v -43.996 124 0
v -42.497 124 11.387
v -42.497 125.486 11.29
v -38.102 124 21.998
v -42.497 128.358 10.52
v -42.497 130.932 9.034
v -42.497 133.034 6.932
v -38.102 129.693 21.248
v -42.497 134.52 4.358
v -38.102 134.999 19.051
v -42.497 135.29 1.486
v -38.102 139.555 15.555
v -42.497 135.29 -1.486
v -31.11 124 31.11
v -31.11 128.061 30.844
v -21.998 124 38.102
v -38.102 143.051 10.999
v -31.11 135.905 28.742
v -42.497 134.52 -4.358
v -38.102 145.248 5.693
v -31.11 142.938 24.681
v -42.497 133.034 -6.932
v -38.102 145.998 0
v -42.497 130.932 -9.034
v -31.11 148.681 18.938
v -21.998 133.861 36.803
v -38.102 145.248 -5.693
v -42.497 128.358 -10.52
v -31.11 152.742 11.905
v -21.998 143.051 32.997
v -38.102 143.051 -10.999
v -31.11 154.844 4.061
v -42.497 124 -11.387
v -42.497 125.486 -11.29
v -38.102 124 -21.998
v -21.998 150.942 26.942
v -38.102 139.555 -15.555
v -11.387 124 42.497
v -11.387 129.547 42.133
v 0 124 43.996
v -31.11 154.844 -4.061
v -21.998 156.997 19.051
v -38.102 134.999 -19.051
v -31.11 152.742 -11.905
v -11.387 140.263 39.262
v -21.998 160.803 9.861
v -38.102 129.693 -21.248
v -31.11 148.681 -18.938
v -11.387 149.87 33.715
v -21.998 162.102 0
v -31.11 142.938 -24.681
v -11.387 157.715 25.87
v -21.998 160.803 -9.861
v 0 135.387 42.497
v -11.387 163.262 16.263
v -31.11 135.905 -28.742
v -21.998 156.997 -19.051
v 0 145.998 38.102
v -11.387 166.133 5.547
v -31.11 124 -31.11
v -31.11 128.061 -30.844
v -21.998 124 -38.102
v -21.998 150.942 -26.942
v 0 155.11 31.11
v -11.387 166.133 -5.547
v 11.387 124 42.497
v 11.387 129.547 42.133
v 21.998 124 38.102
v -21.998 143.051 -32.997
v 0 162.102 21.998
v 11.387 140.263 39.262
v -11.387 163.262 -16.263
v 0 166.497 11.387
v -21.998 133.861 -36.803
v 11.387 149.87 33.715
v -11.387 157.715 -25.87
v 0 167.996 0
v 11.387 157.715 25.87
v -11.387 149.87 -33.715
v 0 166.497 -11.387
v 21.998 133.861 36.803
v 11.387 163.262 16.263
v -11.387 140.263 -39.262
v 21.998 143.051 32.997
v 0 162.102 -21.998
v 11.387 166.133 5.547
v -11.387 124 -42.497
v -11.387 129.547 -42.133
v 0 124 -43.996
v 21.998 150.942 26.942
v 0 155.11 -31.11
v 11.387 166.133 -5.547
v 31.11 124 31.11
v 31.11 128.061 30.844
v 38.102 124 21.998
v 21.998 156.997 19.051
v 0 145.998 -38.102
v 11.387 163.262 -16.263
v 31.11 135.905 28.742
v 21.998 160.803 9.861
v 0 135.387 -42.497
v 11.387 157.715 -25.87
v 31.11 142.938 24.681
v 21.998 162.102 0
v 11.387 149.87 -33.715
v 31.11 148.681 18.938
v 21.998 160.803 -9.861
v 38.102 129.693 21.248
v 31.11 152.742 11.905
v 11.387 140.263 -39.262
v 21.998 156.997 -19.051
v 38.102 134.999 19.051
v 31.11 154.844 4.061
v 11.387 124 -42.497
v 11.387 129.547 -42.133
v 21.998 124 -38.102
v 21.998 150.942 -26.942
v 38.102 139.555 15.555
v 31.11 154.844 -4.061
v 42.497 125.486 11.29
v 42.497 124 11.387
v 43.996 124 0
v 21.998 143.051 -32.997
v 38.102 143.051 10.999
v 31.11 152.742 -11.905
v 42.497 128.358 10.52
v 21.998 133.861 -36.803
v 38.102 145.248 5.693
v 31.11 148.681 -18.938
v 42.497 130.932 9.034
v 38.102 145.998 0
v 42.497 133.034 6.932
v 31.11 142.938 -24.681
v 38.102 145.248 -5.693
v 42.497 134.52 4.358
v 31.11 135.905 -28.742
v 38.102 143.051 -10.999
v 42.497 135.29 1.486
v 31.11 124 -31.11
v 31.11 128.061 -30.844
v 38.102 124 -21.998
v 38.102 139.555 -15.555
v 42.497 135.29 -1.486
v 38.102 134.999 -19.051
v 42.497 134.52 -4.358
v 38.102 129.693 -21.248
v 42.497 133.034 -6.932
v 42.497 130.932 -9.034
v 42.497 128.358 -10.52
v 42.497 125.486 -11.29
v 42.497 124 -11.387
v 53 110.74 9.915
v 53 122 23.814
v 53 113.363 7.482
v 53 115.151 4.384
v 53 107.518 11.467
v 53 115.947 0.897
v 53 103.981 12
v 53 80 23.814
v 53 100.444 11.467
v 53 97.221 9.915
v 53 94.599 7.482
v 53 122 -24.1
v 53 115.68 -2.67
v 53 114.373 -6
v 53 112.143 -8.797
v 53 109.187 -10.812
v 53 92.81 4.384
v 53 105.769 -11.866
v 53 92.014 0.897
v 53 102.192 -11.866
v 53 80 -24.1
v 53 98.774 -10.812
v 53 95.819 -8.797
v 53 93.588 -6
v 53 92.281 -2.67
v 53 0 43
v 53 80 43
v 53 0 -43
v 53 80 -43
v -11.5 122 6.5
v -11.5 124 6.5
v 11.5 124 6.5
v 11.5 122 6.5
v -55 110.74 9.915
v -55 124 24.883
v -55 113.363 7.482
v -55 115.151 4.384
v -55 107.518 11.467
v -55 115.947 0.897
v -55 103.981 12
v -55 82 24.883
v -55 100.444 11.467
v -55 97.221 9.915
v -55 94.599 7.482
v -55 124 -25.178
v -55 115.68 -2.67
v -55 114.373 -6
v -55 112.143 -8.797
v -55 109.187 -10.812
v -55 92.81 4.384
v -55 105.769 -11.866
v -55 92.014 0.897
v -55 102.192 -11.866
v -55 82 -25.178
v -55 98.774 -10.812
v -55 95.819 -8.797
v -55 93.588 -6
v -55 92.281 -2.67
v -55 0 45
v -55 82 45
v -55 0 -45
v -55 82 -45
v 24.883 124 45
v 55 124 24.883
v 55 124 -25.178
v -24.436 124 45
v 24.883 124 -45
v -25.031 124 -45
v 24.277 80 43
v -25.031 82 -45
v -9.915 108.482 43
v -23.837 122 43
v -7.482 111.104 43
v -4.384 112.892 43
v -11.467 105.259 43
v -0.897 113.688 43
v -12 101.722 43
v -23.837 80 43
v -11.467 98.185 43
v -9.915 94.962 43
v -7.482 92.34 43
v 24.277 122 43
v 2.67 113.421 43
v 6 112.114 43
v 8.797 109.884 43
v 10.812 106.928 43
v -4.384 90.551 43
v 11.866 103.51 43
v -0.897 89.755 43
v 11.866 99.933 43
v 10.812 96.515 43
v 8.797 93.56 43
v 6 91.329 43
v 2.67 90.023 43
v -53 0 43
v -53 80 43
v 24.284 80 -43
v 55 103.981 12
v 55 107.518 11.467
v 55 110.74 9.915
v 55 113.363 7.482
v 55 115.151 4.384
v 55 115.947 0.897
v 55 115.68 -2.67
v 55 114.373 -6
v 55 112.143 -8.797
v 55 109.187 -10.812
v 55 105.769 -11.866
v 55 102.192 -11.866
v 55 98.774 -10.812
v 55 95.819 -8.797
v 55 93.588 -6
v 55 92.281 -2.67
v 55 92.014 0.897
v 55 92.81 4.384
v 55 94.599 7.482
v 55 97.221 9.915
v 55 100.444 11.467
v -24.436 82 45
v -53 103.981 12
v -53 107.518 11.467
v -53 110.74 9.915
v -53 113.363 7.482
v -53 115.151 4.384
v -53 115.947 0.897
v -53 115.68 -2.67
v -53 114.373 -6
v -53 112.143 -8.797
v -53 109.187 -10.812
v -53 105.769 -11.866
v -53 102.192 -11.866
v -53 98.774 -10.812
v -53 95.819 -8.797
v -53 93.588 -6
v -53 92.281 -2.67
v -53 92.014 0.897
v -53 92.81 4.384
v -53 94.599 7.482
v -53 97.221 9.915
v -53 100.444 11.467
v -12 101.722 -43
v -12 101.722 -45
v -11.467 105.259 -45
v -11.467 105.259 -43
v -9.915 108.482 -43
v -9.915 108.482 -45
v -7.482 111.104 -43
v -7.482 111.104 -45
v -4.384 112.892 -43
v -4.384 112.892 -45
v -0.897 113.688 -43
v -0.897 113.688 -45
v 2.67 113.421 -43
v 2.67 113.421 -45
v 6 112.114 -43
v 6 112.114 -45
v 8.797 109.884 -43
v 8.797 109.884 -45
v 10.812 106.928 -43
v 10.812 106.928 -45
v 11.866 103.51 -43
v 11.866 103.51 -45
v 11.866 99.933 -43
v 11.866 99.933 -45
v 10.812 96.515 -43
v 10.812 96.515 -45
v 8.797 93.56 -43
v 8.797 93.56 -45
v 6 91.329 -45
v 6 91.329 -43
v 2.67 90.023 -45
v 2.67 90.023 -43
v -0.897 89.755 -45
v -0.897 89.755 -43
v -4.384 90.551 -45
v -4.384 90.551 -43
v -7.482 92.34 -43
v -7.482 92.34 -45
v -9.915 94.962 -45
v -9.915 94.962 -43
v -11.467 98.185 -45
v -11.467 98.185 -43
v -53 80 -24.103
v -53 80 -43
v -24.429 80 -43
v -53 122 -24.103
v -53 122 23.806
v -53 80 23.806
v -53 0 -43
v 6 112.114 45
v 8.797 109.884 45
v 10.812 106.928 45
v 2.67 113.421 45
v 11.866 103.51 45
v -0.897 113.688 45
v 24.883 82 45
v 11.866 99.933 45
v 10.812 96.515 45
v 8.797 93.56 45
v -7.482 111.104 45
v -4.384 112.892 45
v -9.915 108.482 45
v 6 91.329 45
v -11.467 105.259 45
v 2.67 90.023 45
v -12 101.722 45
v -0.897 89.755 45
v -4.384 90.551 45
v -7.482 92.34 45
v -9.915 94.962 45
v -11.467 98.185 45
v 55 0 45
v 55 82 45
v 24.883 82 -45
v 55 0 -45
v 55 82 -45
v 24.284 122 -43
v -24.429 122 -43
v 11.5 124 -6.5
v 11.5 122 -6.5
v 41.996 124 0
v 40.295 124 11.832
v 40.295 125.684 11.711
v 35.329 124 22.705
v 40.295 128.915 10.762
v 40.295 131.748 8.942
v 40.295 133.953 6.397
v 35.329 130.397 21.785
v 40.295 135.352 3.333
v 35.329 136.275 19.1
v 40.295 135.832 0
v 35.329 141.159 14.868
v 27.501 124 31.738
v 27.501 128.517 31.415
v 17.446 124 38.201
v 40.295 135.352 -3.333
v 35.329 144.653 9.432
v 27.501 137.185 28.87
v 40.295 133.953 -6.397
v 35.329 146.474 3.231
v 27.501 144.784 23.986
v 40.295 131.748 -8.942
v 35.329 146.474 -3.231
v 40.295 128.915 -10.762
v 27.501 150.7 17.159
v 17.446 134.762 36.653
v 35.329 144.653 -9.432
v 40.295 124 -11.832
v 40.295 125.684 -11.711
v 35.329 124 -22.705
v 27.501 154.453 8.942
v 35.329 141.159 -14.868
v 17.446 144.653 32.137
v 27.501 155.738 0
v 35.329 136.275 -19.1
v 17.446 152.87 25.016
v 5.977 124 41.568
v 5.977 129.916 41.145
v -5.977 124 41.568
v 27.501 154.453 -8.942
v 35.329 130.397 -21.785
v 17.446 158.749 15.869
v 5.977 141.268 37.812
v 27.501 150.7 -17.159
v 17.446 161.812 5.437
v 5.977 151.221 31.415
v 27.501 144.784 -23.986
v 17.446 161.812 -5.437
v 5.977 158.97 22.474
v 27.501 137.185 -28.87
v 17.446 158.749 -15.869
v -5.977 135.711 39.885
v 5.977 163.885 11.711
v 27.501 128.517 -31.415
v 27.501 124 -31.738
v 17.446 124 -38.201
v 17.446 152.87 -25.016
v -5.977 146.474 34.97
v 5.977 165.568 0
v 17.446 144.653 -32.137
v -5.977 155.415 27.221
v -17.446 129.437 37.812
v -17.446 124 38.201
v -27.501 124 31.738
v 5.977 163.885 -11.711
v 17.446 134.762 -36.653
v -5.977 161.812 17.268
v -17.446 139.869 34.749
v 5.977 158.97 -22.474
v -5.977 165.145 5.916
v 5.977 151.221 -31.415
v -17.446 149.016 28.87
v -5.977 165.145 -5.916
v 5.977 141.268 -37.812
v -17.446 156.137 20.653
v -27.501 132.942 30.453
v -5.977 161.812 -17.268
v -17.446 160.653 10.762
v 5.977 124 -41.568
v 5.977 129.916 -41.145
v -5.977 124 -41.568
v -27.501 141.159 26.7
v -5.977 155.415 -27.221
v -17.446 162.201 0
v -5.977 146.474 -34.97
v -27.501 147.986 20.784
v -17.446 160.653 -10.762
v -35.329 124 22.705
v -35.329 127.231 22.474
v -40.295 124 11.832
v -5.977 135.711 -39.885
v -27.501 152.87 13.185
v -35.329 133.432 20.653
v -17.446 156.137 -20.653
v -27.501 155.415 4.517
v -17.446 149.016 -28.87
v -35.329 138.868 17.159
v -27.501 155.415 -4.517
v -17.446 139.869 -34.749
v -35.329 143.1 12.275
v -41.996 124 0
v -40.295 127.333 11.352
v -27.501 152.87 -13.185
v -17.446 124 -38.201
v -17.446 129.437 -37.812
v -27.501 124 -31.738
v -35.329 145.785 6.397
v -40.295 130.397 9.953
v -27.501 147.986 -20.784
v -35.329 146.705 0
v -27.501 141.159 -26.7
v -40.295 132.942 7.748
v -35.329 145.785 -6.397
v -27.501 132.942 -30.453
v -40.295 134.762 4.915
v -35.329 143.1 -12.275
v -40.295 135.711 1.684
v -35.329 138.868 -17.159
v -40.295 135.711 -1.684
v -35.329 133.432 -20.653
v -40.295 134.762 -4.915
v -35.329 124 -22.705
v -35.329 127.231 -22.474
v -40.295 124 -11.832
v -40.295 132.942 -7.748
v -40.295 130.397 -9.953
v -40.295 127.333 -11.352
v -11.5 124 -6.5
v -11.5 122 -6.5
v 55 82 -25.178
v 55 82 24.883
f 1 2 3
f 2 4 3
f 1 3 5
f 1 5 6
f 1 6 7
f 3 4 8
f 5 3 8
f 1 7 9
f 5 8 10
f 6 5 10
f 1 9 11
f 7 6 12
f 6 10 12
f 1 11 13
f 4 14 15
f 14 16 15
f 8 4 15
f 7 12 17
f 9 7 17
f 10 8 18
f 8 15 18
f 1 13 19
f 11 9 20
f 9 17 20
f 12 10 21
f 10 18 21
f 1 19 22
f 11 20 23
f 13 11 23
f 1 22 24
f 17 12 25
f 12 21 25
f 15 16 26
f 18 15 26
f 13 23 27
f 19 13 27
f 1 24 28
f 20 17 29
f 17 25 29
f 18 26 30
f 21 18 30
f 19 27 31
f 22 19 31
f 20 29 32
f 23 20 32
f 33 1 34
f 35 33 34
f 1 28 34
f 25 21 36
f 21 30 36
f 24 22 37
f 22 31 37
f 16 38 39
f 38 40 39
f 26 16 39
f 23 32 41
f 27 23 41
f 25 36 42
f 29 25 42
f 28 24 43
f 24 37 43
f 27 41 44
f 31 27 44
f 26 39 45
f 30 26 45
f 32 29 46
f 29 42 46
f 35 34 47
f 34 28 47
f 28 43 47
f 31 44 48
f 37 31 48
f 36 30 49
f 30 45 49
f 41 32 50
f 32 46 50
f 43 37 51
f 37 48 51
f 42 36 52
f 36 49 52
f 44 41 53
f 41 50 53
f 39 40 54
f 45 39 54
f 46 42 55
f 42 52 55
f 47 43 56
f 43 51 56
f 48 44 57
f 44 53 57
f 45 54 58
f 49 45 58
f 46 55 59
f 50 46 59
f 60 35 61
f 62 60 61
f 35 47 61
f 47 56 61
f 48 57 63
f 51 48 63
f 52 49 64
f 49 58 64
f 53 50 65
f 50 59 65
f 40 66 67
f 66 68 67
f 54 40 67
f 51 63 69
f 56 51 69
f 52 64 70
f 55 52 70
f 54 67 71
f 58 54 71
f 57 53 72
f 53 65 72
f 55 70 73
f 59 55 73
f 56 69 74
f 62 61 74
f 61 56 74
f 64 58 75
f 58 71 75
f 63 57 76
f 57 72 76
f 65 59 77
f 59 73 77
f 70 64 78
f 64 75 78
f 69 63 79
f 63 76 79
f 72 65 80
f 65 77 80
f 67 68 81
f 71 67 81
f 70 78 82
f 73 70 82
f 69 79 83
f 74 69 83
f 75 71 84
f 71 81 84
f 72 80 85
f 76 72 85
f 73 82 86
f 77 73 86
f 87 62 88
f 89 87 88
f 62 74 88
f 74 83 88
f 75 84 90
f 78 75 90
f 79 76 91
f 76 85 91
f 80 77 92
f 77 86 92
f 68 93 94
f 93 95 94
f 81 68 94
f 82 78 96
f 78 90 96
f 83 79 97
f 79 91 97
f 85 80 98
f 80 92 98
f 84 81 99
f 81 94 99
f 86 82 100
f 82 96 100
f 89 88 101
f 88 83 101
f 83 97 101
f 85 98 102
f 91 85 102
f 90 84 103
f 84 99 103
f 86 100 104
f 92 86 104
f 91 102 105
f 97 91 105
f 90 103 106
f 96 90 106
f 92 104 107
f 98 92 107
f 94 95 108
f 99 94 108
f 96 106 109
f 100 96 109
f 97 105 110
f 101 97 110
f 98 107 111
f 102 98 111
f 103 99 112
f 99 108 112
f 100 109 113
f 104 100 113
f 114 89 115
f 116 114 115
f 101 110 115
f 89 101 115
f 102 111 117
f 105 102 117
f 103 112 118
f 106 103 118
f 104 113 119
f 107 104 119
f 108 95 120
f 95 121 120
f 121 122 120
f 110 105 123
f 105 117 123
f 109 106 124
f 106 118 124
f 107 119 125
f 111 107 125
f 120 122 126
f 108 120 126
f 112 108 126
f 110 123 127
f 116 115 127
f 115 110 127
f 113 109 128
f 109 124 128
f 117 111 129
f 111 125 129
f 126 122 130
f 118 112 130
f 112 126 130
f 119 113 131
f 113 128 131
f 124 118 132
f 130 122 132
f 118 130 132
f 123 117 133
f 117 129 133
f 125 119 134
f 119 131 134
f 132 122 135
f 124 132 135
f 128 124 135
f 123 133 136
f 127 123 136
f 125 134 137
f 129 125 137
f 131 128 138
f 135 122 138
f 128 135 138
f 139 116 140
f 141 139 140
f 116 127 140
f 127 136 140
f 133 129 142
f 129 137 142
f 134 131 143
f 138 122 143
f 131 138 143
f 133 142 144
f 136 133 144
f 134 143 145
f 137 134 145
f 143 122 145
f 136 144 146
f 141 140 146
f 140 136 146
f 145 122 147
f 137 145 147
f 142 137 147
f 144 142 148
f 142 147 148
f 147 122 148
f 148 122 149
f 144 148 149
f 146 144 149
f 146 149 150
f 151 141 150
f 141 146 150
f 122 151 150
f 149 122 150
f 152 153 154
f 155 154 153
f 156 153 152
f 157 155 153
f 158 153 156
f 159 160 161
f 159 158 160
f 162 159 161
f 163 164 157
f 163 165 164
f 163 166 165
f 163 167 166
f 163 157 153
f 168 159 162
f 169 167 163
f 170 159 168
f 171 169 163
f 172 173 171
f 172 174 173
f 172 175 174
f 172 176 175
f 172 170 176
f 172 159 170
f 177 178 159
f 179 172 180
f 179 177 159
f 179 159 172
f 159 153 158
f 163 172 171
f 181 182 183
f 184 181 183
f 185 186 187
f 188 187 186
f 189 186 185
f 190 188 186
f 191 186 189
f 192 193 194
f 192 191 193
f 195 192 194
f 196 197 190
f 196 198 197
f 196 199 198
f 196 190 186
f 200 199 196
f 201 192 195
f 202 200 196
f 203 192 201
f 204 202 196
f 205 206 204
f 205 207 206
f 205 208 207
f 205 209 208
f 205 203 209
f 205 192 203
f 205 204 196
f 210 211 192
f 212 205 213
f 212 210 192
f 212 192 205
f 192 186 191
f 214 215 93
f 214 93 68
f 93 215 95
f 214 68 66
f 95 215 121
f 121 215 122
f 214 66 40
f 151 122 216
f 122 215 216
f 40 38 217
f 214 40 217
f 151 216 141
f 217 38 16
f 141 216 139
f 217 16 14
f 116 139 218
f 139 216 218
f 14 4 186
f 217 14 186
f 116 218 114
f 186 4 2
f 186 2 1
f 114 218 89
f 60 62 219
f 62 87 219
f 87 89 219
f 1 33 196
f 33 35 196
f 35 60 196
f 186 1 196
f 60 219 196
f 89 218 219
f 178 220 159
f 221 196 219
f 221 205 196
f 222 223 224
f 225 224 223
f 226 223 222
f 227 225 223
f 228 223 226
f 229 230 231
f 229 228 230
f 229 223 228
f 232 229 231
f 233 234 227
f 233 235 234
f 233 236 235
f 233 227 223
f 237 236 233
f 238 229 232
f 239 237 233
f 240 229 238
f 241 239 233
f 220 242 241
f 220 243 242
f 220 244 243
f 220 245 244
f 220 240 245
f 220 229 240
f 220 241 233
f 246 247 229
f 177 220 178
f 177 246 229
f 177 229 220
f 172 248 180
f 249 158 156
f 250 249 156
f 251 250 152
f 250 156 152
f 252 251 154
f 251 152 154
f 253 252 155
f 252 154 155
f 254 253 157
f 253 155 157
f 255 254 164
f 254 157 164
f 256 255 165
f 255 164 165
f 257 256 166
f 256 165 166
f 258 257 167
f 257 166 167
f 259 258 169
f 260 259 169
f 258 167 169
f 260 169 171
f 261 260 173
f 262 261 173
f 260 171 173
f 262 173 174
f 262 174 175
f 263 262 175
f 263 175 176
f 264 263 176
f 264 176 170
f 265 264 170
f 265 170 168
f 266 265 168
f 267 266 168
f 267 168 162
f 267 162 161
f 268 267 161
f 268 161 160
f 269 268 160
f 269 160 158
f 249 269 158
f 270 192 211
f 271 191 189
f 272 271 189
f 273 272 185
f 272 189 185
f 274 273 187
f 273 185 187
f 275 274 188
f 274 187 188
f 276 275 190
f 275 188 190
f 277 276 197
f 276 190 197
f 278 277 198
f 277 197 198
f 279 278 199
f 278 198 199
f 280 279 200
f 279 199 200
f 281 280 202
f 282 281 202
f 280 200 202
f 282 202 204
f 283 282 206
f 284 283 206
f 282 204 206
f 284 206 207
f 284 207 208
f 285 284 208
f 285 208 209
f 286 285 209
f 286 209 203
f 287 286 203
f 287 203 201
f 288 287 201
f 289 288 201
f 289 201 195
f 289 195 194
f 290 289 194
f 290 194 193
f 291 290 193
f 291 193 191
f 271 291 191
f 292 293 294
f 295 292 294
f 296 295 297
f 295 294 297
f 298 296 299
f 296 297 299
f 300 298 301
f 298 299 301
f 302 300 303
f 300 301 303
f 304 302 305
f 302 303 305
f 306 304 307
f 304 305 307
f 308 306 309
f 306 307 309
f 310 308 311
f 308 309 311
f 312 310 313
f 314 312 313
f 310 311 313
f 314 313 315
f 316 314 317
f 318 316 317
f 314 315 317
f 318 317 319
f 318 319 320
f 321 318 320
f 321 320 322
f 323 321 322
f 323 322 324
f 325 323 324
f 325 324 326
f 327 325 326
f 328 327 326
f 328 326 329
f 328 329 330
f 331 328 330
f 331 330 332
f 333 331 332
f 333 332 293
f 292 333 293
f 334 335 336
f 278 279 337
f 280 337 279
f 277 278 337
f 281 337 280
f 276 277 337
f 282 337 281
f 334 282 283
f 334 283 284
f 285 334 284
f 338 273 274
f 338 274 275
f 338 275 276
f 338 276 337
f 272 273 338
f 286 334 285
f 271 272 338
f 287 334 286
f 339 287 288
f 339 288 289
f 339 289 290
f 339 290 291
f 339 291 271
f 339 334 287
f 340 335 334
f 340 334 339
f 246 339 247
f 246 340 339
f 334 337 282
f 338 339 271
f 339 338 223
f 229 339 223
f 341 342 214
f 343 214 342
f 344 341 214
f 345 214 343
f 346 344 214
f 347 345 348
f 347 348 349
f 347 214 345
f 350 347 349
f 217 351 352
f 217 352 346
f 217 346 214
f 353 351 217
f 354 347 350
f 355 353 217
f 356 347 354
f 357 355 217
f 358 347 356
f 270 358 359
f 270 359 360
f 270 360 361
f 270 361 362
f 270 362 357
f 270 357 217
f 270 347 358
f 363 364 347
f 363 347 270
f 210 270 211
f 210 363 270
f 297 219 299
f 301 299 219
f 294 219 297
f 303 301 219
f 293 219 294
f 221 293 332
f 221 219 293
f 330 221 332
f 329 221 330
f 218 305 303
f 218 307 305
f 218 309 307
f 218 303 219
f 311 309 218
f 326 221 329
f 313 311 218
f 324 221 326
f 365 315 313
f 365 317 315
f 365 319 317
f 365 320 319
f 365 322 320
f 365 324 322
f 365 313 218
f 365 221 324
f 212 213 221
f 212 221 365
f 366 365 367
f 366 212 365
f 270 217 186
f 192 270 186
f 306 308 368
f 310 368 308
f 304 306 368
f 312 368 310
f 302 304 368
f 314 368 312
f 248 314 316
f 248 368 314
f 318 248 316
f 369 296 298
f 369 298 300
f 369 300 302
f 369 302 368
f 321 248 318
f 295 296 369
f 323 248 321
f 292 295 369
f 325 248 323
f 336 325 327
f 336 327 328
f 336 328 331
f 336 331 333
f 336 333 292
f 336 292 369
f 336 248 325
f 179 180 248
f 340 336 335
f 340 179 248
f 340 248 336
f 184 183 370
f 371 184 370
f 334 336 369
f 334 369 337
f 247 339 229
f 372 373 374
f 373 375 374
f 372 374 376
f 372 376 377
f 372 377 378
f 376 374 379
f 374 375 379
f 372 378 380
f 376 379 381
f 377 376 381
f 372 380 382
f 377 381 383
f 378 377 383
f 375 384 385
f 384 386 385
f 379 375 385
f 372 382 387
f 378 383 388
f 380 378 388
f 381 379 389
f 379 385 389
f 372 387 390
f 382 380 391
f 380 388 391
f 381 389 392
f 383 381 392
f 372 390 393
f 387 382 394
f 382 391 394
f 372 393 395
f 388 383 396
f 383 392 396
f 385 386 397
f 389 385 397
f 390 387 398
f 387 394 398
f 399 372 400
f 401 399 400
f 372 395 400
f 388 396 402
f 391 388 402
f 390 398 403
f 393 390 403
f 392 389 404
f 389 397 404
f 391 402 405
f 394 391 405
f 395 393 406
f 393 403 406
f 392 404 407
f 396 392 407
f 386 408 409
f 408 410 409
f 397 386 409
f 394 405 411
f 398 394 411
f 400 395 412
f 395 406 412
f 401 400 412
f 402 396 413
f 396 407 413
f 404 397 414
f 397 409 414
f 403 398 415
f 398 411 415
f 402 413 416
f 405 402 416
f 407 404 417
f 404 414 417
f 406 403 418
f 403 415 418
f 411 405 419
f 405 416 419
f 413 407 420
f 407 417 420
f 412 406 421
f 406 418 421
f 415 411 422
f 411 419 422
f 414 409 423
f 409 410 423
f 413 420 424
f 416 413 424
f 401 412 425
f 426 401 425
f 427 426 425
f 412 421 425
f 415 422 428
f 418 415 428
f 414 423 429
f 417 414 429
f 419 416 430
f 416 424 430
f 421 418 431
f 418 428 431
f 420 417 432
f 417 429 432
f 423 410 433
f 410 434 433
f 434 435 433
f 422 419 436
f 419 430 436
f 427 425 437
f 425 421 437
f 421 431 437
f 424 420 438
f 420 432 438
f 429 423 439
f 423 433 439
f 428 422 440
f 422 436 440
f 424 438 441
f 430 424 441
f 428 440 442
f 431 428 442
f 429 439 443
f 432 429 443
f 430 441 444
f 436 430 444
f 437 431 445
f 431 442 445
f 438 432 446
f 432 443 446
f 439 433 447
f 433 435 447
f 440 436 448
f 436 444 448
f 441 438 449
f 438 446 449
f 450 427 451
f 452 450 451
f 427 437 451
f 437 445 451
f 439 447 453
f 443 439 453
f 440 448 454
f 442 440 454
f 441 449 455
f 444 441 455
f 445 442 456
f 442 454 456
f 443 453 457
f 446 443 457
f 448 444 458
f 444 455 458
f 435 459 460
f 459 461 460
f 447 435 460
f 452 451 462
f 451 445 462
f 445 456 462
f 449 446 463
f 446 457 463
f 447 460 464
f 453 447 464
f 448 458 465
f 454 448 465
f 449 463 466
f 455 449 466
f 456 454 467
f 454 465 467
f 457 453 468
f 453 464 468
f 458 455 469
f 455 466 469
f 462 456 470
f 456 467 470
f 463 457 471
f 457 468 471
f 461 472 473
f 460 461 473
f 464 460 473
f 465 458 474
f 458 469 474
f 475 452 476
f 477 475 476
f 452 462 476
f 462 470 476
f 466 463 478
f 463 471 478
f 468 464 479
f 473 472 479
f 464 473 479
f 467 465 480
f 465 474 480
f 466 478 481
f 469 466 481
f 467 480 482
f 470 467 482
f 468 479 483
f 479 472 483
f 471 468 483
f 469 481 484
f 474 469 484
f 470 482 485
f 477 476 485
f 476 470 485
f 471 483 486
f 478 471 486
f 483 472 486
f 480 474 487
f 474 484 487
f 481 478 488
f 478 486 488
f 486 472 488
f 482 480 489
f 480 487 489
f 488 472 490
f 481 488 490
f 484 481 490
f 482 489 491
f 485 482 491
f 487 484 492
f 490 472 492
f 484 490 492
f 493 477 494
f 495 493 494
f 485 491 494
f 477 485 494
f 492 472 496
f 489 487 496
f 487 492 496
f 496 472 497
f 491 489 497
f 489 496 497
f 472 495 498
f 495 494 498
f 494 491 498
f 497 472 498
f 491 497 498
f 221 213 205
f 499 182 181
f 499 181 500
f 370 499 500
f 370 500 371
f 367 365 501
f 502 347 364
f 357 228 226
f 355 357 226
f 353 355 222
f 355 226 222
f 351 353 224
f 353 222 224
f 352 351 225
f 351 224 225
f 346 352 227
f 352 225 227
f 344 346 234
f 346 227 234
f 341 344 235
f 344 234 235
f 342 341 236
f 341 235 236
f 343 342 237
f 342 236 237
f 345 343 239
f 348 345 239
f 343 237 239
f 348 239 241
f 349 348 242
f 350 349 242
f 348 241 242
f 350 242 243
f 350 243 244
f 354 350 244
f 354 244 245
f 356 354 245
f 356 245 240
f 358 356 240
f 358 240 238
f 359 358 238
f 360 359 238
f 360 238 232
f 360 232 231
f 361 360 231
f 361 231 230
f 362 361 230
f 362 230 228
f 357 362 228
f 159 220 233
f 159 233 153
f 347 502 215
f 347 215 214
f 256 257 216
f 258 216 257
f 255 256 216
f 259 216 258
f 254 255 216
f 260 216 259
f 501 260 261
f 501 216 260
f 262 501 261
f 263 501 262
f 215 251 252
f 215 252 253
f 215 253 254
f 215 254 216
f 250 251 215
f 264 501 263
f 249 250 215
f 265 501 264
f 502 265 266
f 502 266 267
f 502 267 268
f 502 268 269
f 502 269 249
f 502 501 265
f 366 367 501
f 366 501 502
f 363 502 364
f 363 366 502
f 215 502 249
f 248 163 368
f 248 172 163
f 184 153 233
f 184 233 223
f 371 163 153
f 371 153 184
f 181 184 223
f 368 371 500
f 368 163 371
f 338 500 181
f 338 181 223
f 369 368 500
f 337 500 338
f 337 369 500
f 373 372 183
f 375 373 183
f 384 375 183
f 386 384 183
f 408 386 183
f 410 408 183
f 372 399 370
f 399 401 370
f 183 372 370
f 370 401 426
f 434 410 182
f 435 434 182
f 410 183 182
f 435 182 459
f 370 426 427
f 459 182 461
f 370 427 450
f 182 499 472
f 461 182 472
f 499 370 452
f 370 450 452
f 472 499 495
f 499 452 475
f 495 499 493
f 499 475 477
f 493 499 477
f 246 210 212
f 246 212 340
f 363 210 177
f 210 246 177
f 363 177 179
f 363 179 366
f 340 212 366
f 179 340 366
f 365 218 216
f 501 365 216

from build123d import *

# Parameters (mm, degrees)
SKETCH1_W           = 110
SKETCH1_H           = 90
SKETCH1_W_2         = 106
SKETCH1_H_2         = 86
BOSS_EXTRUDE1_DEPTH = 80
SKETCH2_W           = 110
SKETCH2_H           = 90
BOSS_EXTRUDE2_DEPTH = 2
BOSS_EXTRUDE3_DEPTH = 40
CUT_EXTRUDE1_DEPTH  = 40
BOSS_EXTRUDE4_DEPTH = 2
SKETCH11_W          = 23
SKETCH11_H          = 13
CUT_EXTRUDE2_DEPTH  = 13
REVOLVE_THIN3_ANGLE = 180
SKETCH13_R          = 12
CUT_EXTRUDE3_DEPTH  = 97
SKETCH14_R          = 12
CUT_EXTRUDE4_DEPTH  = 112


with BuildPart() as part:
    # Sketch1 → Boss-Extrude1 (new body)
    with BuildSketch(Plane(origin=(0, 0, 0), x_dir=(1, 0, 0), z_dir=(0, 1, 0))):
        Rectangle(SKETCH1_W, SKETCH1_H)
        Rectangle(SKETCH1_W_2, SKETCH1_H_2, mode=Mode.SUBTRACT)
    extrude(amount=BOSS_EXTRUDE1_DEPTH)

    # Sketch2 → Boss-Extrude2 (add)
    with BuildSketch(Plane(origin=(0, 80, 0), x_dir=(1, 0, 0), z_dir=(0, 1, 0))):
        Rectangle(SKETCH2_W, SKETCH2_H)
    extrude(amount=BOSS_EXTRUDE2_DEPTH)

    # Sketch3 → Boss-Extrude3 (add)
    with BuildSketch(Plane(origin=(0, 82, 0), x_dir=(1, 0, 0), z_dir=(0, 1, 0))):
        Polygon((55, 25.177973791), (24.883494565, 45), (-25.030734178, 45), (-55, 25.177973791), (-55, -24.883494565), (-24.436078892, -45), (24.883494565, -45), (55, -24.883494565), align=None)
        Polygon((53, 24.100004746), (24.284378107, 43), (-24.429161834, 43), (-53, 24.102910351), (-53, -23.805525521), (-23.836962434, -43), (24.27696917, -43), (53, -23.814274516), align=None, mode=Mode.SUBTRACT)
    extrude(amount=BOSS_EXTRUDE3_DEPTH)

    # Sketch7 → Cut-Extrude1 (cut)
    with BuildSketch(Plane(origin=(0, 82, 0), x_dir=(1, 0, 0), z_dir=(0, 1, 0))):
        Polygon((-24.429161834, 43), (-53, 24.102910351), (-53, -23.805525521), (-23.836962434, -43), (24.27696917, -43), (53, -23.814274516), (53, 24.100004746), (24.284378107, 43), align=None)
    extrude(amount=-CUT_EXTRUDE1_DEPTH, mode=Mode.SUBTRACT)

    # Sketch8 → Boss-Extrude4 (add)
    with BuildSketch(Plane(origin=(0, 122, 0), x_dir=(1, 0, 0), z_dir=(0, 1, 0))):
        Polygon((24.883494565, 45), (55, 25.177973791), (55, -24.883494565), (24.883494565, -45), (-24.436078892, -45), (-55, -24.883494565), (-55, 25.177973791), (-25.030734178, 45), align=None)
    extrude(amount=BOSS_EXTRUDE4_DEPTH)

    # Sketch11 → Cut-Extrude2 (cut)
    with BuildSketch(Plane(origin=(0, 124, 0), x_dir=(1, 0, 0), z_dir=(0, 1, 0))):
        Rectangle(SKETCH11_W, SKETCH11_H)
    extrude(amount=-CUT_EXTRUDE2_DEPTH, mode=Mode.SUBTRACT)

    # Sketch12 → Revolve-Thin3 (revolve)
    with BuildSketch(Plane(origin=(0, 124, 0), x_dir=(1, 0, 0), z_dir=(0, 1, 0))):
        with BuildLine():
            ThreePointArc((-43.995827048, 0), (0, -43.995827048), (43.995827048, 0))
            Line((43.995827048, 0), (41.995827048, 0))
            ThreePointArc((41.995827048, 0), (0, -41.995827048), (-41.995827048, 0))
            Line((-41.995827048, 0), (-43.995827048, 0))
        make_face()
    revolve(axis=Axis((43.995827048, 124, 0), (-1, 0, 0)), revolution_arc=REVOLVE_THIN3_ANGLE)

    # Sketch13 → Cut-Extrude3 (cut)
    with BuildSketch(Plane(origin=(0, 0, -45), x_dir=(-1, 0, 0), z_dir=(0, 0, -1))):
        with Locations((0, 101.721715456)):
            Circle(SKETCH13_R)
    extrude(amount=-CUT_EXTRUDE3_DEPTH, mode=Mode.SUBTRACT)

    # Sketch14 → Cut-Extrude4 (cut)
    with BuildSketch(Plane.ZY.offset(55)):
        with Locations((0, 103.980631389)):
            Circle(SKETCH14_R)
    extrude(amount=-CUT_EXTRUDE4_DEPTH, mode=Mode.SUBTRACT)


solid = part.part
